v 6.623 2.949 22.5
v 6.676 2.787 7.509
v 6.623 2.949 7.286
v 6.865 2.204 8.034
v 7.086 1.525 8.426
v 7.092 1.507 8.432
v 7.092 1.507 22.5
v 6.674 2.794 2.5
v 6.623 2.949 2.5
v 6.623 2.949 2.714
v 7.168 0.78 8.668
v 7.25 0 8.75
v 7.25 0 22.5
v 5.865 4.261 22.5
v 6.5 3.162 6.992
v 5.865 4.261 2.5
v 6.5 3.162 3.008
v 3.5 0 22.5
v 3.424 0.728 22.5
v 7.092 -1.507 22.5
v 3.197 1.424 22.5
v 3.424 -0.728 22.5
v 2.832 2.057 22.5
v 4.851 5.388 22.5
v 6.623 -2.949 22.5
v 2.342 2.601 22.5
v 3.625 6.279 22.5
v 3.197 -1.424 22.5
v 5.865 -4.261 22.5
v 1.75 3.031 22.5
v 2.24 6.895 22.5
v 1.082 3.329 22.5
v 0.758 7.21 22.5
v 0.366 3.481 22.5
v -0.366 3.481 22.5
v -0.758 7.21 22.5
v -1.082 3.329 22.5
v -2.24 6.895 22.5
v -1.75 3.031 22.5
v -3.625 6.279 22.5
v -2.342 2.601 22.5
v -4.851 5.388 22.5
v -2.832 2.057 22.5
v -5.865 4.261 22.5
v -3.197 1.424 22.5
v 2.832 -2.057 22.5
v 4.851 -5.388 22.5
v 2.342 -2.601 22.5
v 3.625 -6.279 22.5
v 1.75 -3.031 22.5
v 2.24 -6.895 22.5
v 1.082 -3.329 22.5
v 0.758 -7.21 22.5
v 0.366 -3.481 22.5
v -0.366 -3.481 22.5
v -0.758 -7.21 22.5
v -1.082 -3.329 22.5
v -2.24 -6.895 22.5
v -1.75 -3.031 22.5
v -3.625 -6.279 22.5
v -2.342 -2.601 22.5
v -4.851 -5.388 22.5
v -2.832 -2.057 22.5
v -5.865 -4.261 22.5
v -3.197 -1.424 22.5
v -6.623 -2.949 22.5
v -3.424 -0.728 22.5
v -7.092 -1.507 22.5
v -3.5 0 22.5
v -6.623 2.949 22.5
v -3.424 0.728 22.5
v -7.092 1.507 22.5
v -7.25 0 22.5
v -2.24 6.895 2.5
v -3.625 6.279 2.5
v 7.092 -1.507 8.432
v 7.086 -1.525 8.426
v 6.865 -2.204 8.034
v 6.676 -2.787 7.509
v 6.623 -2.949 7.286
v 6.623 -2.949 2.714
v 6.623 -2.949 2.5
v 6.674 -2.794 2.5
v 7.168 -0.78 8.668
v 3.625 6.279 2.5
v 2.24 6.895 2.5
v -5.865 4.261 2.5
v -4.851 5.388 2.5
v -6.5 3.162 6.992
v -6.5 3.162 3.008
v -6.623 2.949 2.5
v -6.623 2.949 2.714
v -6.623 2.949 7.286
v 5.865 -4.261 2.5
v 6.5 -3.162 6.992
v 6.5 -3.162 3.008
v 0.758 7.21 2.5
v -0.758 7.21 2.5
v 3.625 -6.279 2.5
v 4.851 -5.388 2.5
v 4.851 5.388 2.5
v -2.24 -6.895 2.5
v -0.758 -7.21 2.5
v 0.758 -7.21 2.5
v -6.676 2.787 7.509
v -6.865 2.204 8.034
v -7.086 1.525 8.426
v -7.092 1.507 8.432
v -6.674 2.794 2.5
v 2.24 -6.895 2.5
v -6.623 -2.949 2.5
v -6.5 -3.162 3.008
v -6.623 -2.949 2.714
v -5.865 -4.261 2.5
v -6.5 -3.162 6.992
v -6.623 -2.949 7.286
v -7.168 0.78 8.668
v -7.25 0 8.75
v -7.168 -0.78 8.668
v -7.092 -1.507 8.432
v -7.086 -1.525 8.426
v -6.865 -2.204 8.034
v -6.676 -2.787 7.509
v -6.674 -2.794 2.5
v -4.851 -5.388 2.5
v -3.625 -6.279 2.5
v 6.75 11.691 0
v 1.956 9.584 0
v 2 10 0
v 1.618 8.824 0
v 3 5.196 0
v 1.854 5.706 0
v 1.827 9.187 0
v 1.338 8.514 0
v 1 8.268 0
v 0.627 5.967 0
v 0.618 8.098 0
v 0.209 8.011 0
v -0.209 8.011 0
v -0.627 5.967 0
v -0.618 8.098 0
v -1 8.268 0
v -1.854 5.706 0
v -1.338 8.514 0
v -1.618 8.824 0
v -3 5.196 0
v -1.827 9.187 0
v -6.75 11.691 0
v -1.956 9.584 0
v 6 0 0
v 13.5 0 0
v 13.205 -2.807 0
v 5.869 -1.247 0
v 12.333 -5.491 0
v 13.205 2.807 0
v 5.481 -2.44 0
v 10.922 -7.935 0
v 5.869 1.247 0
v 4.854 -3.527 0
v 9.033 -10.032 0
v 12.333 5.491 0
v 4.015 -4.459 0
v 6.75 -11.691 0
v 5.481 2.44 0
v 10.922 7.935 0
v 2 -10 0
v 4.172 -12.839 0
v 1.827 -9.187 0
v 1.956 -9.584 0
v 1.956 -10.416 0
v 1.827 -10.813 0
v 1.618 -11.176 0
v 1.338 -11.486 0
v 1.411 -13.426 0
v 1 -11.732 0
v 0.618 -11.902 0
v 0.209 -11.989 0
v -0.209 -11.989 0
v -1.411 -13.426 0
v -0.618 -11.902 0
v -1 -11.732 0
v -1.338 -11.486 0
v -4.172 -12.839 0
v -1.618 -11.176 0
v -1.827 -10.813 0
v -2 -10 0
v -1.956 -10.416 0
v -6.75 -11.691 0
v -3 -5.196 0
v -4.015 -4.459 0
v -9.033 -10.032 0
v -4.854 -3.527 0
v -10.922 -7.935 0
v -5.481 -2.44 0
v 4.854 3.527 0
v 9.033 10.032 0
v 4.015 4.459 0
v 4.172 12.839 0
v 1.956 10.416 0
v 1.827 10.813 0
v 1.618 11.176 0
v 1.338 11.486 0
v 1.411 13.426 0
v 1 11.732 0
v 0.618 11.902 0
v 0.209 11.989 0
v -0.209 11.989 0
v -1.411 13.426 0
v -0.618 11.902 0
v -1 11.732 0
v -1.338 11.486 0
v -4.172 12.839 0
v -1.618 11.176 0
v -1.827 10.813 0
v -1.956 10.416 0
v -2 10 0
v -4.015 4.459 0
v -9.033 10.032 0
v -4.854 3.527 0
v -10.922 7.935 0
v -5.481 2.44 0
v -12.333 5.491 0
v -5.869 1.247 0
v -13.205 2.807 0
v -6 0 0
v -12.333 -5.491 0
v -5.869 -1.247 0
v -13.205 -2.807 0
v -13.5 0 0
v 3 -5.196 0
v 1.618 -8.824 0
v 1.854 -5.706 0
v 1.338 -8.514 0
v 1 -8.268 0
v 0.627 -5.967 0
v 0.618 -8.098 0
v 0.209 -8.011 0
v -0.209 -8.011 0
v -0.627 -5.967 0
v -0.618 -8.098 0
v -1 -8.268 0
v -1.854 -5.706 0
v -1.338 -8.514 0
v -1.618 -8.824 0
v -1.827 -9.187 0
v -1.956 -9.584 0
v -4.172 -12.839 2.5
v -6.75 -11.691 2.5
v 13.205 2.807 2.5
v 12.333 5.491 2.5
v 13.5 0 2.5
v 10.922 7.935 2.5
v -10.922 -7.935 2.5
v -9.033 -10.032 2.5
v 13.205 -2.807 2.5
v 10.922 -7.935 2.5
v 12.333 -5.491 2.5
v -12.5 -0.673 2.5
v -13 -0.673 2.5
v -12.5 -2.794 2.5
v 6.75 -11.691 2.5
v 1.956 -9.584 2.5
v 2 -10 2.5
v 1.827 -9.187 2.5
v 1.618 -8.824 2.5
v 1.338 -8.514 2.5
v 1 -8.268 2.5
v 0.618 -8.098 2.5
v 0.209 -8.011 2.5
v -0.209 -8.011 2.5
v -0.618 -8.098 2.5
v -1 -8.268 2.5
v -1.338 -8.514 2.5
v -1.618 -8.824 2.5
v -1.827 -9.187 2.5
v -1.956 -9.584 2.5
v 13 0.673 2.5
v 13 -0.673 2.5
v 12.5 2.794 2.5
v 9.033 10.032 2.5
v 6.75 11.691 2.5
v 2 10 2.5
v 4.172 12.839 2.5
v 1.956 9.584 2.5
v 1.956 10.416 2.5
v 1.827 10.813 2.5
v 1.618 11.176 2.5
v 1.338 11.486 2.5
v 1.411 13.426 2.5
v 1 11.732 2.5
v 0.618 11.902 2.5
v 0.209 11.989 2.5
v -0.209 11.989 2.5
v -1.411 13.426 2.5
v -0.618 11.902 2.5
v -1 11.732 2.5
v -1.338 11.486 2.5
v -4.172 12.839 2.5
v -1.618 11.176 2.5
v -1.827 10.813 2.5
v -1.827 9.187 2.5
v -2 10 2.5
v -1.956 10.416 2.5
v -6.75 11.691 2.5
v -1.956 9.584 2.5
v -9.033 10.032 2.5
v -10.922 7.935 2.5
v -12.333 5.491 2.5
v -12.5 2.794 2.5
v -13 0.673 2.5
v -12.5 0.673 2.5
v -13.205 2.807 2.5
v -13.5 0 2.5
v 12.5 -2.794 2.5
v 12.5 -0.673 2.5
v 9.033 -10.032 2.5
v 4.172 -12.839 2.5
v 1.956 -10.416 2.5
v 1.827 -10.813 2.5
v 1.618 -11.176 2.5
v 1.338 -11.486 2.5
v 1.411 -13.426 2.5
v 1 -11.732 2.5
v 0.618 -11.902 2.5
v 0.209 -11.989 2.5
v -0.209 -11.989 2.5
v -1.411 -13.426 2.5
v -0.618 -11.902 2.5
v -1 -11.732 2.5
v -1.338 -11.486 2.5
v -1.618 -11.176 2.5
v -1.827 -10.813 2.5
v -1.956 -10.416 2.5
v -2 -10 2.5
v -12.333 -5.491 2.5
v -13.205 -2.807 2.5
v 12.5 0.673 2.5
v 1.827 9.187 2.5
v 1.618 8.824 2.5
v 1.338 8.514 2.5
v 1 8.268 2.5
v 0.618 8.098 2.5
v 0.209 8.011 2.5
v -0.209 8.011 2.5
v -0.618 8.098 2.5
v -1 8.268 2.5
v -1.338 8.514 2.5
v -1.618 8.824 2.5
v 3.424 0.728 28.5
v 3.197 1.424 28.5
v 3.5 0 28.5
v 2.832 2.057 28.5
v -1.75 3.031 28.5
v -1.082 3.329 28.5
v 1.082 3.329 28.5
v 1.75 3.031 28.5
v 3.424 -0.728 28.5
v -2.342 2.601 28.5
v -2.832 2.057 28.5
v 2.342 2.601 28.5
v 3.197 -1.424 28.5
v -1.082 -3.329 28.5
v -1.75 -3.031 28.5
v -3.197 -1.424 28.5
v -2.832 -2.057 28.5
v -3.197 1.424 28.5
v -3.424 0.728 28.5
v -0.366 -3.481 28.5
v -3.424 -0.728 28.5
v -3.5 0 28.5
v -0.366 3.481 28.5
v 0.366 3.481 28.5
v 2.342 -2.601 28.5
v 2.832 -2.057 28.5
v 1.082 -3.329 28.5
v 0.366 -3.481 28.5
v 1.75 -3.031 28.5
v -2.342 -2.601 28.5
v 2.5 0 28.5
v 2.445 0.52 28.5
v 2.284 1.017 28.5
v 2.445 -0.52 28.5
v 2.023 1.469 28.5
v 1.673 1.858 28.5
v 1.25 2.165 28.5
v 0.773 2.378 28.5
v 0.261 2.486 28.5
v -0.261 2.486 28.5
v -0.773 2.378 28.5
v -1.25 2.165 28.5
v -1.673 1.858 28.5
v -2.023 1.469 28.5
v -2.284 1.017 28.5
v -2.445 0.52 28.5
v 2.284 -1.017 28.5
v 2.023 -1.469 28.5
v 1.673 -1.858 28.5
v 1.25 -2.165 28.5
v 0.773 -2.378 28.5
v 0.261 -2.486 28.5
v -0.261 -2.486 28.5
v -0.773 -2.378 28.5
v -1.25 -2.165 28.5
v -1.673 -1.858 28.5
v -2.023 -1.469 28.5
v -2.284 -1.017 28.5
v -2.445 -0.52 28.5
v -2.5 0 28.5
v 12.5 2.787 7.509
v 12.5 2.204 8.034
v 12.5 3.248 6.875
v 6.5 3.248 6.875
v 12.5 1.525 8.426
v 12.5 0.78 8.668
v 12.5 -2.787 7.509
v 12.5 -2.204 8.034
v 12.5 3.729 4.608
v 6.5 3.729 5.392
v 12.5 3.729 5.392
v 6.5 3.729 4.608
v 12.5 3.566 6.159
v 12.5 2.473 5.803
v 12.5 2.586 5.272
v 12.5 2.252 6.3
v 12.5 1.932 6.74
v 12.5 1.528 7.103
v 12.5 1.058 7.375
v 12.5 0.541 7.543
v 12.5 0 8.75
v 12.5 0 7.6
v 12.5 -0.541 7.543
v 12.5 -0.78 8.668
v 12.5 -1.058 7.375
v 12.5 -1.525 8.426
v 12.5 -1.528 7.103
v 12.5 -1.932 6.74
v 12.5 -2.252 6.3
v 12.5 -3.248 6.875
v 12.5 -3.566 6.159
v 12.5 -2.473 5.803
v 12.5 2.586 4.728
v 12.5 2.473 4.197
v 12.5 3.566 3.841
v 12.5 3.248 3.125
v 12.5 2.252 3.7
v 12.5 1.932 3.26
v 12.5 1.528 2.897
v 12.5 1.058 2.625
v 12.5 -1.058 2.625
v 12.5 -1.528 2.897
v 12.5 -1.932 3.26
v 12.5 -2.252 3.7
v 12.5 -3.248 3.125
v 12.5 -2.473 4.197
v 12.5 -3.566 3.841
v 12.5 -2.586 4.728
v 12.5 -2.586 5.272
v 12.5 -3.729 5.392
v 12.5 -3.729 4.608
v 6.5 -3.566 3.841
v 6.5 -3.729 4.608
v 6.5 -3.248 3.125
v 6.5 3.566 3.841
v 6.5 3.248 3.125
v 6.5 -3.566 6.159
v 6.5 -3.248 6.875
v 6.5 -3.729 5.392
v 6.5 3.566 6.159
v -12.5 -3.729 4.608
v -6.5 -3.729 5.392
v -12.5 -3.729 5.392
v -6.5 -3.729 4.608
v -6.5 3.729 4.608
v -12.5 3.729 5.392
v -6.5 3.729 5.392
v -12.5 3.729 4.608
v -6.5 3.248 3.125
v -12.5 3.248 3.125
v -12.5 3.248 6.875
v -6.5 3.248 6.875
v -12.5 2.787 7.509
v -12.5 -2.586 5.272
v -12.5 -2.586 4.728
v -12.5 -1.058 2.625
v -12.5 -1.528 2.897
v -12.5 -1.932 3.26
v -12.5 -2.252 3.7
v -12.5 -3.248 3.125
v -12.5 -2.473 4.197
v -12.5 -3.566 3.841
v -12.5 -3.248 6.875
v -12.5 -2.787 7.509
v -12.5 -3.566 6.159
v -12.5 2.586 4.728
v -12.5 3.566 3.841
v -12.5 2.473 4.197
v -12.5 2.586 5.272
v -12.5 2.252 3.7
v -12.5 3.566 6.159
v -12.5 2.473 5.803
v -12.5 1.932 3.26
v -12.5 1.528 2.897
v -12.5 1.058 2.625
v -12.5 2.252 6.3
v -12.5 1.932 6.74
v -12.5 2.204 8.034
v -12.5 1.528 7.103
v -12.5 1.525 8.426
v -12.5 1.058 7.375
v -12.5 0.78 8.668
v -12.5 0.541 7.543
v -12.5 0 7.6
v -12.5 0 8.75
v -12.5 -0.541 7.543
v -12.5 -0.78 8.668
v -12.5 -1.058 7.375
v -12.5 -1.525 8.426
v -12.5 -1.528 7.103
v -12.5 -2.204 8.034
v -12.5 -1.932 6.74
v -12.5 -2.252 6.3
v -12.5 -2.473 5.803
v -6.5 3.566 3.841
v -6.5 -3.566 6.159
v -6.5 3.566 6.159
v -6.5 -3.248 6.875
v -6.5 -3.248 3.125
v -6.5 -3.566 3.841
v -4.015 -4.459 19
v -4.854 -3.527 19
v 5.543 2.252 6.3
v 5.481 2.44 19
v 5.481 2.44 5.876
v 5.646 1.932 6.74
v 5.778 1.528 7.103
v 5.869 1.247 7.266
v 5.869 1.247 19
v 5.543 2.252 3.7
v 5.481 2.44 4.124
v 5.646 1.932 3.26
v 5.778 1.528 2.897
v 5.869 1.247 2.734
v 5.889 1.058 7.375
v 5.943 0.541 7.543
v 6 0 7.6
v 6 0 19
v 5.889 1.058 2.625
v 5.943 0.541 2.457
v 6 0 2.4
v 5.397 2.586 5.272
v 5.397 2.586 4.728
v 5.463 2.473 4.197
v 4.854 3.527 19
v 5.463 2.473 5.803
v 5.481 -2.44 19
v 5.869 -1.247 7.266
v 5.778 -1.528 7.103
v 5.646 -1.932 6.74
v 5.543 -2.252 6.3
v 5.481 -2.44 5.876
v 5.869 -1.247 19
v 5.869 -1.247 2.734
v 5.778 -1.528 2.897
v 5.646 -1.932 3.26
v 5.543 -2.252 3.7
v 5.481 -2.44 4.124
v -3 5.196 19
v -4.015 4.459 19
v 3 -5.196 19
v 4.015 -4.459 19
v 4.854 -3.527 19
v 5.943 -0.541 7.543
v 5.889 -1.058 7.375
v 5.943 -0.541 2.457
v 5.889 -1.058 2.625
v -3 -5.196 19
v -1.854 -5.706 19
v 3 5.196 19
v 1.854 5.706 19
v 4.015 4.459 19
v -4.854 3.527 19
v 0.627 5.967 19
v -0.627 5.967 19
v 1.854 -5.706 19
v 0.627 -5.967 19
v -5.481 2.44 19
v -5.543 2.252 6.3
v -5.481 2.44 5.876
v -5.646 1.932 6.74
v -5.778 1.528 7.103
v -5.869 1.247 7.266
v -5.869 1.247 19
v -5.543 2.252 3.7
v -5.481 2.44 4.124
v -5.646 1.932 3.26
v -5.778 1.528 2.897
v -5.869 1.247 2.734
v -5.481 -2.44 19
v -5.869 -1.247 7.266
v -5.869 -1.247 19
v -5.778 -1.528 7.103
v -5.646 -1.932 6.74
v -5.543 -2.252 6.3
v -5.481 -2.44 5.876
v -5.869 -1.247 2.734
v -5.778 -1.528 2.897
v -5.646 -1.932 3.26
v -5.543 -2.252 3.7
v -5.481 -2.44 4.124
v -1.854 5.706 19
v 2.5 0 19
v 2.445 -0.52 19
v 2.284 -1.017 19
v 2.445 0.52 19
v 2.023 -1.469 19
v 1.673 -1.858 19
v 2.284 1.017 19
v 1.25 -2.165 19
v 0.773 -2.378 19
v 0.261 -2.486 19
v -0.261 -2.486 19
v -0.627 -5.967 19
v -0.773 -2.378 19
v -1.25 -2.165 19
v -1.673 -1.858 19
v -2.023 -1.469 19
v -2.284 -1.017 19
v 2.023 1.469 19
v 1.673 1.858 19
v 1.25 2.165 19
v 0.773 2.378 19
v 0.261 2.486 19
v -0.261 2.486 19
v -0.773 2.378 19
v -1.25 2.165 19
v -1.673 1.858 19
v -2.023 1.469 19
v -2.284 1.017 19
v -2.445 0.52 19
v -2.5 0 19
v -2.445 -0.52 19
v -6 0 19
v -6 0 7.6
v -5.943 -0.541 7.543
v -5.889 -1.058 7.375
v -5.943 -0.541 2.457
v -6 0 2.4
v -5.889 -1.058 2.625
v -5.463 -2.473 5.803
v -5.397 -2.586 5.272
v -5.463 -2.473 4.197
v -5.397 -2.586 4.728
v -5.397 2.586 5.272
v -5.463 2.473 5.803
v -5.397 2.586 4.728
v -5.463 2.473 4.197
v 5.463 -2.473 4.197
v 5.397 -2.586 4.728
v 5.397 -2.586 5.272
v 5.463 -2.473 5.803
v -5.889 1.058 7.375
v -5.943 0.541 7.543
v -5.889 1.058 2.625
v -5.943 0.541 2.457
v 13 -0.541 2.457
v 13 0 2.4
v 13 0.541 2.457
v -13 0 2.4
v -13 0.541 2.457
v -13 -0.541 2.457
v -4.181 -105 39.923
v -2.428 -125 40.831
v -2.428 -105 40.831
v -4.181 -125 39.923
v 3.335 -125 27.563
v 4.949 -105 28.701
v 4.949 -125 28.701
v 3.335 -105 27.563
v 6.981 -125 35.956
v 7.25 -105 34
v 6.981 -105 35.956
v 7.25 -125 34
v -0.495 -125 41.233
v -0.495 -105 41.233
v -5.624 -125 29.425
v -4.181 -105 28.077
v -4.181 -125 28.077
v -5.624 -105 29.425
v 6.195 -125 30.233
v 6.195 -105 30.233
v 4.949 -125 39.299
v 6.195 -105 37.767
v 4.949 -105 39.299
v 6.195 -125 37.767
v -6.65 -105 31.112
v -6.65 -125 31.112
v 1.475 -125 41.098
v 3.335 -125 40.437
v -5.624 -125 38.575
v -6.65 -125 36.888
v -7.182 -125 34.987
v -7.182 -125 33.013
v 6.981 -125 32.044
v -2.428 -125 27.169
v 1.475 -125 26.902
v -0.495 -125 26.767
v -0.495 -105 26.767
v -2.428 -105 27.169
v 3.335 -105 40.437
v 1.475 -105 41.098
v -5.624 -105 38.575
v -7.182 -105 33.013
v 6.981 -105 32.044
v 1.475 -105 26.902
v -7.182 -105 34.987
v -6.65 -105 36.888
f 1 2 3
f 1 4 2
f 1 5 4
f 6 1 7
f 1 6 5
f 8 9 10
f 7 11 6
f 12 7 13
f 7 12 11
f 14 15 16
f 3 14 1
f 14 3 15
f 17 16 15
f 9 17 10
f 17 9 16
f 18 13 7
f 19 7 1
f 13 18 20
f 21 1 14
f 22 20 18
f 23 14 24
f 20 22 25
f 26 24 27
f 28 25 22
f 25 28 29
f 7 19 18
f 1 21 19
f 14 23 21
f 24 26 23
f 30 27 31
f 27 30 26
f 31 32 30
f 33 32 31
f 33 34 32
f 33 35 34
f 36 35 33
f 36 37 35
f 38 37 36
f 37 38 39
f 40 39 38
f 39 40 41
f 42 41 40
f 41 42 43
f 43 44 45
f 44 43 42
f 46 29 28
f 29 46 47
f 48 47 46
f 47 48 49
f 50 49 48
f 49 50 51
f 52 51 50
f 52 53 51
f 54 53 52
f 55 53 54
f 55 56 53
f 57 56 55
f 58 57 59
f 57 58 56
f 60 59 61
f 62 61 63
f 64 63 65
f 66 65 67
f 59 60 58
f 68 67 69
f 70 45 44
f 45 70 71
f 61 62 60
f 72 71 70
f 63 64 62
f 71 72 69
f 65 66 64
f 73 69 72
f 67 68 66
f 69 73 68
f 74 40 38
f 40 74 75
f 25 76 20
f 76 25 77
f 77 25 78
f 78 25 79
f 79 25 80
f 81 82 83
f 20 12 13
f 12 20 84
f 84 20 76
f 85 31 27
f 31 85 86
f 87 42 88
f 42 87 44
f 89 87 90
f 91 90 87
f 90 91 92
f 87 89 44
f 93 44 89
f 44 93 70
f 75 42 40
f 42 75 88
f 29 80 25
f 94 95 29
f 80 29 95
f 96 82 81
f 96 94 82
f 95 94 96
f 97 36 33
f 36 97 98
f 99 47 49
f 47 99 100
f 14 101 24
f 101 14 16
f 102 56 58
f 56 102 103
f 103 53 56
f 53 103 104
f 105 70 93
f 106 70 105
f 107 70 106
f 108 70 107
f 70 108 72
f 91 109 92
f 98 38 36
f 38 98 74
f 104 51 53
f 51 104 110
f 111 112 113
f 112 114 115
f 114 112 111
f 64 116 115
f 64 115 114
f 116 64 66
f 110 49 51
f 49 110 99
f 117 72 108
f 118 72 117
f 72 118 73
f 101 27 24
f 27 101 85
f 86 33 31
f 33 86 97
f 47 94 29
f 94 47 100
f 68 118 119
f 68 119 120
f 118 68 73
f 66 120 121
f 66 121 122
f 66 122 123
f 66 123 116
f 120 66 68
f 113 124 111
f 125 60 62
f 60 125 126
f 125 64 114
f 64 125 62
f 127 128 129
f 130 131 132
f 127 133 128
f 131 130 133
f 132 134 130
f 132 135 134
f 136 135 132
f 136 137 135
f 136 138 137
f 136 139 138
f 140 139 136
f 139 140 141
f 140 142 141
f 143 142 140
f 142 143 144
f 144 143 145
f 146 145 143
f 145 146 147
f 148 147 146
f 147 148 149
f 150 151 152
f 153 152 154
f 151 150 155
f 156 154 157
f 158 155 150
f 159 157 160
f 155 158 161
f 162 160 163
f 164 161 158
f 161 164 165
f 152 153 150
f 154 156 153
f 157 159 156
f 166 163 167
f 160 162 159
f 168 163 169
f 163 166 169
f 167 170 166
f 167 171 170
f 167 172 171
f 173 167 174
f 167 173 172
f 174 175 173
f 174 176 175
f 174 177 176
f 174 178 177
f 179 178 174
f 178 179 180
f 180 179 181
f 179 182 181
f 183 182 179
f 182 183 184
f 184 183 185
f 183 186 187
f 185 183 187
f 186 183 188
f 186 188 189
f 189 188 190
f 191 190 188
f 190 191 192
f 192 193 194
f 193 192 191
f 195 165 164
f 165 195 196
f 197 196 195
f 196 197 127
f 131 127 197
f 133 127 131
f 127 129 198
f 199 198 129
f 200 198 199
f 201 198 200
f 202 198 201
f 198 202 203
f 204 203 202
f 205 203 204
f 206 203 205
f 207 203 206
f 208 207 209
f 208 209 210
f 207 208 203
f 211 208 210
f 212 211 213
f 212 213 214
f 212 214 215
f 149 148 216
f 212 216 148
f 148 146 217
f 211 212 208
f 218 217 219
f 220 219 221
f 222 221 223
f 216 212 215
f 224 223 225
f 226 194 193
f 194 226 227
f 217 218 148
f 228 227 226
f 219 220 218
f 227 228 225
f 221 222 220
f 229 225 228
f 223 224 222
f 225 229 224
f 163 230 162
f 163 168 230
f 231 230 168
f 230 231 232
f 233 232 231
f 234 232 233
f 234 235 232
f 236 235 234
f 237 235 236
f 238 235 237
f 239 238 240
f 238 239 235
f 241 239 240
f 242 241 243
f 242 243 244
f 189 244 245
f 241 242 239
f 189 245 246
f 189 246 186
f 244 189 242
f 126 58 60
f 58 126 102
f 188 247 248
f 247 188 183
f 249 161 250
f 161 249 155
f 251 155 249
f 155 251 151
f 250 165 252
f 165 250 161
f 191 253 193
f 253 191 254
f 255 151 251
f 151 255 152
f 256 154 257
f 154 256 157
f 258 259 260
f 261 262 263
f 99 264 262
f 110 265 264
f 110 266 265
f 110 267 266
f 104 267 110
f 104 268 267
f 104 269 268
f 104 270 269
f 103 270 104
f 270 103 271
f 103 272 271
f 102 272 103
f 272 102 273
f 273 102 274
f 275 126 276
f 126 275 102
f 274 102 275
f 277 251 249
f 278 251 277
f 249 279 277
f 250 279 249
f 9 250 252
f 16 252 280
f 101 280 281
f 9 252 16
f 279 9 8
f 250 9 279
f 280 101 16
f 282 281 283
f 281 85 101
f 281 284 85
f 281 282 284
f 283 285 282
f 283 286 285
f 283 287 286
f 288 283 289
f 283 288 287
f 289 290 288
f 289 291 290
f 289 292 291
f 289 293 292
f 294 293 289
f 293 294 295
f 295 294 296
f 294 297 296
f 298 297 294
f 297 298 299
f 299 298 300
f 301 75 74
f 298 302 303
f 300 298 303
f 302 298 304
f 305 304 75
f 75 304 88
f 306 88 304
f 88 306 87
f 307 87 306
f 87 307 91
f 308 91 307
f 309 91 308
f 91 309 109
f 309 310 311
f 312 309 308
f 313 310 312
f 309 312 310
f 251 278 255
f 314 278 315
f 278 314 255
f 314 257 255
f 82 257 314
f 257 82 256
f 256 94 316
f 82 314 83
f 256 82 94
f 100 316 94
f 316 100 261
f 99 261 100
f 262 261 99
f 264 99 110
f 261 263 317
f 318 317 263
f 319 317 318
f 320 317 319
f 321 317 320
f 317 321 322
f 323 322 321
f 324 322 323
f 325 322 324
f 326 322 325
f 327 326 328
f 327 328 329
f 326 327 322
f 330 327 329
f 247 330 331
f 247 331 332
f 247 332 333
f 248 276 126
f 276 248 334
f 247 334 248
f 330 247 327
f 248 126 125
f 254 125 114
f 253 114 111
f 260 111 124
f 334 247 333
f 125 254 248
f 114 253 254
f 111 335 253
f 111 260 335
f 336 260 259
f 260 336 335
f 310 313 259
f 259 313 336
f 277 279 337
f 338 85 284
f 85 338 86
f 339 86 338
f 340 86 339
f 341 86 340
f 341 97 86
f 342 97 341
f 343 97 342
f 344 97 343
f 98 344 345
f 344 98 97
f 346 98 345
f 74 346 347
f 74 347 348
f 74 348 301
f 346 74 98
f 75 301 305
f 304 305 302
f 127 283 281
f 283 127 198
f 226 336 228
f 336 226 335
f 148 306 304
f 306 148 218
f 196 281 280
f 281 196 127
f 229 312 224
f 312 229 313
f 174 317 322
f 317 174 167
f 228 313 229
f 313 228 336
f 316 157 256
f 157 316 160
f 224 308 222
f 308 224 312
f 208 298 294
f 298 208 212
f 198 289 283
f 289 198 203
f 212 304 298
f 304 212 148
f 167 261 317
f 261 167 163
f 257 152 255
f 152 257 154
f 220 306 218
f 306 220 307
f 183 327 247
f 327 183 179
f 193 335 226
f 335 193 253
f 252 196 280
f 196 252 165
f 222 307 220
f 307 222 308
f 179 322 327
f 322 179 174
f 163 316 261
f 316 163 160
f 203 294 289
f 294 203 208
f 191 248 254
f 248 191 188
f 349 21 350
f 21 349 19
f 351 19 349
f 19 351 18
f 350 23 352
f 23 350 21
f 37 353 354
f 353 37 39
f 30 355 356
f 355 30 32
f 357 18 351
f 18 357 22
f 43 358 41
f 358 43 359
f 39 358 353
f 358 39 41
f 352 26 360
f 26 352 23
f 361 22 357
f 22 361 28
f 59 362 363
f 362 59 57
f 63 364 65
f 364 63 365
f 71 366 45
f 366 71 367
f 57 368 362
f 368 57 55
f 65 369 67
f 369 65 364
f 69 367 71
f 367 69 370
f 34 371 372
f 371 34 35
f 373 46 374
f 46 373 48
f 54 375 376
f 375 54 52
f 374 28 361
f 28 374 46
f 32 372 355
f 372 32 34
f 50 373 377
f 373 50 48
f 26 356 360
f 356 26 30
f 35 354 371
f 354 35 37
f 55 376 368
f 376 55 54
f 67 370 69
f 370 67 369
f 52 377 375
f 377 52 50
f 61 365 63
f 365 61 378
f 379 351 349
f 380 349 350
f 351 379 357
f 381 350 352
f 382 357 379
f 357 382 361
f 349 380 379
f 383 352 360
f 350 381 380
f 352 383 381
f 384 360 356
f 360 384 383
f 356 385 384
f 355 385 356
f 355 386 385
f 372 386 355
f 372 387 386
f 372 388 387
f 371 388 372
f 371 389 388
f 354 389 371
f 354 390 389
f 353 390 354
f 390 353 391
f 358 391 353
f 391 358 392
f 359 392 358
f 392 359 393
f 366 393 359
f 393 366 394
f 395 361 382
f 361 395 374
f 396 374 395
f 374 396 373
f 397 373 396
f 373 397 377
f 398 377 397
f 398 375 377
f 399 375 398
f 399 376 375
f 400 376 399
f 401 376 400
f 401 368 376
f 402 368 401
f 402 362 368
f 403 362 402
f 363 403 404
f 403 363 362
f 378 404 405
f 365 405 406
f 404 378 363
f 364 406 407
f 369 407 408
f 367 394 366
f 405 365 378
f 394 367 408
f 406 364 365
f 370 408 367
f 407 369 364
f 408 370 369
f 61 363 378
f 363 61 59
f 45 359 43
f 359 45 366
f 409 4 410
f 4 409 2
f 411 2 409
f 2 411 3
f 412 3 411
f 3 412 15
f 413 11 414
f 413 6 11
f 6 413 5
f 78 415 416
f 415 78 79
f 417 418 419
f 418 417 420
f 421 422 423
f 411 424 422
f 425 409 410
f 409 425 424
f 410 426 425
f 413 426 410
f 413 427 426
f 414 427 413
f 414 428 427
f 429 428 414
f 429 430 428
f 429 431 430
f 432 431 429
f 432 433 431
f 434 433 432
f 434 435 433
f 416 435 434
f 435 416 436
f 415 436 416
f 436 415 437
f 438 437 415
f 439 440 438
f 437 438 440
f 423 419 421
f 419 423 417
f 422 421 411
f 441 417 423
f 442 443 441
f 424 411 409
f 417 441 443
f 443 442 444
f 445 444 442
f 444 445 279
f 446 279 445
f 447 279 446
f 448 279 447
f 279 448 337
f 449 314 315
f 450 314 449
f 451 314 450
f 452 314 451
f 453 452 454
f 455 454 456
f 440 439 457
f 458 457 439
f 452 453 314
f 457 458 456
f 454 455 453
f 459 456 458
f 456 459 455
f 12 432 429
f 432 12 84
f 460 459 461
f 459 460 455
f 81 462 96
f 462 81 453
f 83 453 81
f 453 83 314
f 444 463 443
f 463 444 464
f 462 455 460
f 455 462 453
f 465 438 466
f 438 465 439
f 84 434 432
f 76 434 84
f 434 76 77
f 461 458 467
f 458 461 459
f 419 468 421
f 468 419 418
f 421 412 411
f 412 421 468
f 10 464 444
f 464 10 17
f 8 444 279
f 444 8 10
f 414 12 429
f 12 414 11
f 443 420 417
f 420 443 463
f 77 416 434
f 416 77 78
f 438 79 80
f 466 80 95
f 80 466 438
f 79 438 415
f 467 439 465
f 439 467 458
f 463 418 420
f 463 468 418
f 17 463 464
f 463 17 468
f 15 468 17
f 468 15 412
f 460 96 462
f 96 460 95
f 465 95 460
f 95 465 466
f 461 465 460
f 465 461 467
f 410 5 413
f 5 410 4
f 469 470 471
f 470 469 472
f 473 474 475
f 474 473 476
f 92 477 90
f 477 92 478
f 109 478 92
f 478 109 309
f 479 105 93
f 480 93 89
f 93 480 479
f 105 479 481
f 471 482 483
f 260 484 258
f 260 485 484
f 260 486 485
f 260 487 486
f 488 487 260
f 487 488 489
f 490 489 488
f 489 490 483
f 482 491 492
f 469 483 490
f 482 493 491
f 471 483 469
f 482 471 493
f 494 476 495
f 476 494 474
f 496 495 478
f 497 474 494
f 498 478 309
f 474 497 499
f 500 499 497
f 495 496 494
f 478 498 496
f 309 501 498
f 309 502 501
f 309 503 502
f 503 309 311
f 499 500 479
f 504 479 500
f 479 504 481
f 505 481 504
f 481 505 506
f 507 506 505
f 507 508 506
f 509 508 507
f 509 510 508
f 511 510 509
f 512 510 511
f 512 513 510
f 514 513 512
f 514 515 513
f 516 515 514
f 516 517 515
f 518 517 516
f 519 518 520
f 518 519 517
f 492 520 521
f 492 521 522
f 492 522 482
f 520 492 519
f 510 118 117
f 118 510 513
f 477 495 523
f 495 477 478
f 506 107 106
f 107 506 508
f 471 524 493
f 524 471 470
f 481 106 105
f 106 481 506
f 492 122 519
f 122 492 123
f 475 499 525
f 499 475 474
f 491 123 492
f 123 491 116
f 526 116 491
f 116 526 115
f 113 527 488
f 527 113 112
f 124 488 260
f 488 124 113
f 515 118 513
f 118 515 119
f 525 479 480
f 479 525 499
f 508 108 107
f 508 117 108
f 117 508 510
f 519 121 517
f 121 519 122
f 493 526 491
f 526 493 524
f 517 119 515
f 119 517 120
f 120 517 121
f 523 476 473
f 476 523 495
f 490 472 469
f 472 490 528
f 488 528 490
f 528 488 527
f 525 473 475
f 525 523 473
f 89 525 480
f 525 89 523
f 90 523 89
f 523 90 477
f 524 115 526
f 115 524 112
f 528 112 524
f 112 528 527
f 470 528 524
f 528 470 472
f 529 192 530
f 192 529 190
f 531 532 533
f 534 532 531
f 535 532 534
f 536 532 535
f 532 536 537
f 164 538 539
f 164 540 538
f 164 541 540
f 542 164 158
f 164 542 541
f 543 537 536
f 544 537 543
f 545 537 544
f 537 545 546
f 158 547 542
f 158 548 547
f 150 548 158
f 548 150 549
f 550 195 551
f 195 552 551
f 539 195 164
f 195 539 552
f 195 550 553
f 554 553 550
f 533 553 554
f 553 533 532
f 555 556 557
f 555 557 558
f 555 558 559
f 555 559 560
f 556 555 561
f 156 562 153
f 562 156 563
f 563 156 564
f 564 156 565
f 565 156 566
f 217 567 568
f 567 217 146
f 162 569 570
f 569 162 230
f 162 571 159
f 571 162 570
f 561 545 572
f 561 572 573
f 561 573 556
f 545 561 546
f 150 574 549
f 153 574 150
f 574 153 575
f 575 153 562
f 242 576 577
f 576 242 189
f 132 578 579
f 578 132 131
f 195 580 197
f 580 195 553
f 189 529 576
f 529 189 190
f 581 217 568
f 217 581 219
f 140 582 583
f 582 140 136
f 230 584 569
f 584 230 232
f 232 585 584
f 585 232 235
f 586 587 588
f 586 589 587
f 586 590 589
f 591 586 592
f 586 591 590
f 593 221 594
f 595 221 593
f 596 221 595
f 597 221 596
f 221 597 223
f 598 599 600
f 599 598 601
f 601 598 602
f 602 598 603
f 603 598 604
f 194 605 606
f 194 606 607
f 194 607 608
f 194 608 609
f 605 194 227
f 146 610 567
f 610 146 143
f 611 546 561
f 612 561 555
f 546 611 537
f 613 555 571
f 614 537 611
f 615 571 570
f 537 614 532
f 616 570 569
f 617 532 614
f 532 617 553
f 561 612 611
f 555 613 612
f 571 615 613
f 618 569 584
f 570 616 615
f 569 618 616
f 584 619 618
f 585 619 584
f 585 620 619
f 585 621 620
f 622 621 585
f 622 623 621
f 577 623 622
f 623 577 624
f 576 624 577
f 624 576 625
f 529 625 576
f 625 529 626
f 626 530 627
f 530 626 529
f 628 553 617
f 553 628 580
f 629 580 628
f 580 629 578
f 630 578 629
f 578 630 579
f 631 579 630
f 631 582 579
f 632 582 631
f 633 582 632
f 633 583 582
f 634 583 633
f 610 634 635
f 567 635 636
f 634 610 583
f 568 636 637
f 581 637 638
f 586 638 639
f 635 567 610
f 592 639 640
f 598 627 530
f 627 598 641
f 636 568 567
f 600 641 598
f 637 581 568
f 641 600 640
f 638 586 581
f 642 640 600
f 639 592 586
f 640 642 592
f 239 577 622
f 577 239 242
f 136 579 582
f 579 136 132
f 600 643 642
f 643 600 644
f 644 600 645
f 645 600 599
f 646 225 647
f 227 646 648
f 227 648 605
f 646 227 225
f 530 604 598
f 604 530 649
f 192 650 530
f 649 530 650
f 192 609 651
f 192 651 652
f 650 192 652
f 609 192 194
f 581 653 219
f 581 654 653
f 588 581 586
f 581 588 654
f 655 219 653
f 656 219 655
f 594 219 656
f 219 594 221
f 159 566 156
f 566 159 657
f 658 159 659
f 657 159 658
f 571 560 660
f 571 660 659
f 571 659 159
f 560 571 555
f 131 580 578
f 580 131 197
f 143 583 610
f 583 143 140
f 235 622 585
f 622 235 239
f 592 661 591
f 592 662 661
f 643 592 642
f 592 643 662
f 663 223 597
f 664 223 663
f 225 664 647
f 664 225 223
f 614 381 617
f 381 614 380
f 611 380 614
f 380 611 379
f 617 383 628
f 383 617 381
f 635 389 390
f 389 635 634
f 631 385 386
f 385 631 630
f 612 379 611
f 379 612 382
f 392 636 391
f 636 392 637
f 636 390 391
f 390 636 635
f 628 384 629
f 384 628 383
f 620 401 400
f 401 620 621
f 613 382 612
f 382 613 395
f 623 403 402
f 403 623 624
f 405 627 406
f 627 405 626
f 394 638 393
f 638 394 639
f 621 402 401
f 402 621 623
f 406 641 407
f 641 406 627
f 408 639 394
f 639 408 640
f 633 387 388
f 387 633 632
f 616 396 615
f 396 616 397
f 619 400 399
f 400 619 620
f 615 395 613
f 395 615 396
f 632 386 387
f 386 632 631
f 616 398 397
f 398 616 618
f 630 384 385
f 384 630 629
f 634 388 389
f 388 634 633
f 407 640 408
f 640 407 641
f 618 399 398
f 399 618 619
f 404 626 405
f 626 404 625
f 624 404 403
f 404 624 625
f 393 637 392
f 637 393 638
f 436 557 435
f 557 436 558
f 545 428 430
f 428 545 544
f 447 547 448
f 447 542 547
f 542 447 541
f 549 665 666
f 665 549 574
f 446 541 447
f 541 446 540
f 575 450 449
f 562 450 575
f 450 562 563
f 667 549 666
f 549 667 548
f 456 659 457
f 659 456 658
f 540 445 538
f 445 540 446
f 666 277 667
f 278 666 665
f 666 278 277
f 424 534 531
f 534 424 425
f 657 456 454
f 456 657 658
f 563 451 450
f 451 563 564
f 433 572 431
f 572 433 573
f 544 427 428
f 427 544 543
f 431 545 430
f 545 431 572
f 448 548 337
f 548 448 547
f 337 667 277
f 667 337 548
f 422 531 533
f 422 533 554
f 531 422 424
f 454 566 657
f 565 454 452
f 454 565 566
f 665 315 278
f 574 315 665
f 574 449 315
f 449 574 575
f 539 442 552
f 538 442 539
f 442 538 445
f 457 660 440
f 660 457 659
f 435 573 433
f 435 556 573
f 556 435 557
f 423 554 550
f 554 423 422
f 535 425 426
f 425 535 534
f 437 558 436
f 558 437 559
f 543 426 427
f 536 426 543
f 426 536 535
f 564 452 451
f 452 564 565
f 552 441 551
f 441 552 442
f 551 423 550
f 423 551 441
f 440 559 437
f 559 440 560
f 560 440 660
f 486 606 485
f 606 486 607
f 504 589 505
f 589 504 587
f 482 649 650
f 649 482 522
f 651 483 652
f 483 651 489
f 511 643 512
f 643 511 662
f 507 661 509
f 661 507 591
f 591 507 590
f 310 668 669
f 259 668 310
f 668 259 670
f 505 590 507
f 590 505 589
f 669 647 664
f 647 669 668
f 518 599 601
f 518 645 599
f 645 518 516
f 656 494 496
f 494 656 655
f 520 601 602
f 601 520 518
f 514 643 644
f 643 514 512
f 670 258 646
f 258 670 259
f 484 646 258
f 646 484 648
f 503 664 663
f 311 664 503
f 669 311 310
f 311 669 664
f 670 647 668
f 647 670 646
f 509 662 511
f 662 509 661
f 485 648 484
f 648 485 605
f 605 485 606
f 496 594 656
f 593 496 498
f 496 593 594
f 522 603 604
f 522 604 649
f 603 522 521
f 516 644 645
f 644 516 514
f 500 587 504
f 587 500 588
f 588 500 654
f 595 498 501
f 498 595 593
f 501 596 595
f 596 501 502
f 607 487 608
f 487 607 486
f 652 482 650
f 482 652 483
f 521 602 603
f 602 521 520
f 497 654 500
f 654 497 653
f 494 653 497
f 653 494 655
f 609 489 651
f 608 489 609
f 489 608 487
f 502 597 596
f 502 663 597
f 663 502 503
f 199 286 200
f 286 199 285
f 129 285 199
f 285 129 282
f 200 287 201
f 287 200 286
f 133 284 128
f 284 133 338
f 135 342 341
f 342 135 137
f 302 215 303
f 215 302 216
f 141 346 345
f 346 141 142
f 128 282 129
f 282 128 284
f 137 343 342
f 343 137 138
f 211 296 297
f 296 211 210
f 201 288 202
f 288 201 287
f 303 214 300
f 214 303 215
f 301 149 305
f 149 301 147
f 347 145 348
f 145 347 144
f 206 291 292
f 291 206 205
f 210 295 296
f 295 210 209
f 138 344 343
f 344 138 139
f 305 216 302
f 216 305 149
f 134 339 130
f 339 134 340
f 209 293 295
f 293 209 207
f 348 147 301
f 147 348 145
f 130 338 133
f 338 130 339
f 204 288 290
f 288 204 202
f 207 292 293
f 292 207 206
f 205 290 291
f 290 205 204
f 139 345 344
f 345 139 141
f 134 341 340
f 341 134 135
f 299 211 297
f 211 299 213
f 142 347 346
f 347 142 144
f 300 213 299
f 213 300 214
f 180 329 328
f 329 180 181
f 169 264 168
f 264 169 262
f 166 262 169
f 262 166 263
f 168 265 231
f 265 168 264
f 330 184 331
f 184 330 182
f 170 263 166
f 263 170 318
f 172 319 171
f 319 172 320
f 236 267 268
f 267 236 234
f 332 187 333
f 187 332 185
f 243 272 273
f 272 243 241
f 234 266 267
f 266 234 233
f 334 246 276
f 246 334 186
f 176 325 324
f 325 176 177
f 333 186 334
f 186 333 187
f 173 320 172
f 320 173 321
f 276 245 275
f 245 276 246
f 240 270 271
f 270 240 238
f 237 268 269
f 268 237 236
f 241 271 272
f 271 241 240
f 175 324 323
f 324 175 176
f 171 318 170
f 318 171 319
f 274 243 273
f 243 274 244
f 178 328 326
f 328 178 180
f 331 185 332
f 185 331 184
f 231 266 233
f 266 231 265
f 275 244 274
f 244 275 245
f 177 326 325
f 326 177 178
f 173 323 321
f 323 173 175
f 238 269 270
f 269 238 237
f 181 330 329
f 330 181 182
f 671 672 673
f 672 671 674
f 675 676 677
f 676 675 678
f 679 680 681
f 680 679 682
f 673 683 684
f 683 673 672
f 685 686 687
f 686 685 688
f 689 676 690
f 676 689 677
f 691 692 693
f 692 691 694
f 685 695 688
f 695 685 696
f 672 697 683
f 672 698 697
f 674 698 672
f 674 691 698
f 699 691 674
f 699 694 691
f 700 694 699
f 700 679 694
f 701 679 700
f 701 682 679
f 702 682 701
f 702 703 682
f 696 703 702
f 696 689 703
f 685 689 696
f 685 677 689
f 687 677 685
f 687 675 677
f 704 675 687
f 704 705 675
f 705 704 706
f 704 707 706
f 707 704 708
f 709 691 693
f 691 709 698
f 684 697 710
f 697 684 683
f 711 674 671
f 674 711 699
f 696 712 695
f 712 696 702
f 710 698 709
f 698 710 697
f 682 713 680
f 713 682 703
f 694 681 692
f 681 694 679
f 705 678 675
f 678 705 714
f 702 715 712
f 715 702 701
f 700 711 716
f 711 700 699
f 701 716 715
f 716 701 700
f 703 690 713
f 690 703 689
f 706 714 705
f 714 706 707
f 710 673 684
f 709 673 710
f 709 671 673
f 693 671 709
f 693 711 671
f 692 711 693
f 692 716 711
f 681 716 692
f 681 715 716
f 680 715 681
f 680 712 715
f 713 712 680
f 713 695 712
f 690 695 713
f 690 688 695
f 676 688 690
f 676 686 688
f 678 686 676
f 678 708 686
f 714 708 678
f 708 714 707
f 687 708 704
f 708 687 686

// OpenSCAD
screwD = 4;

noseHoleD = 12;
noseHoleH = 20;
tolerance = 0.1;

ledD = 5;
ledH = 6;
wallT = 2.5;

backWallL = 170;
backWallD = 250;
backWallH = 170;

pokeAreaH = 80;


module nosePoke(){
    $fn=30;
difference(){
union(){
cylinder(d=noseHoleD+wallT,h=noseHoleH+wallT);
cylinder(d=noseHoleD+2*screwD+7,h=wallT);
translate([0,0,noseHoleH+wallT]){
cylinder(d=ledD+2,h=ledH);
}//end translate

translate([(noseHoleD+1)/2,0,ledD]){
rotate([0,90,0]){
    cylinder(d=ledD+wallT,h=ledH);
}//end rotate
}//end translate

translate([-(noseHoleD+1)/2,0,ledD]){
rotate([0,-90,0]){
    cylinder(d=ledD+wallT,h=ledH);
}//end rotate
}//end translate
}//end union


translate([0,0,-1]){
cylinder(d=noseHoleD,h=noseHoleH);
cylinder(d=ledD,h=ledH+noseHoleH+wallT+5);
}//end translate

translate([(noseHoleD+1)/2-wallT,0,ledD]){
rotate([0,90,0]){
    cylinder(d=ledD+2*tolerance,h=ledH+3);
}//end rotate
}//end translate

translate([-(noseHoleD+1)/2+wallT,0,ledD]){
rotate([0,-90,0]){
    cylinder(d=ledD+2*tolerance,h=ledH+3);
}//end rotate
}//end translate

translate([0,(noseHoleD)/2+screwD,-1]){
cylinder(d=screwD,h=10);
}//end translate

translate([0,-(noseHoleD)/2-screwD,-1]){
cylinder(d=screwD,h=10);
}//end translate
}//end difference
}//end module



module backWall(){
    $fn=10;
    
    
    difference(){
    
    cylinder(d=backWallD,h=pokeAreaH);
    
    union(){
    translate([0,0,-1]){
    
        cylinder(d=backWallD-15,h=pokeAreaH+2);
        
    }//end transalte

    translate([-backWallD/2,0,-1]){
    cube([backWallD+4,backWallD,pokeAreaH+2]);
    }//end translate
}//end union
}//end difference
    }//end module
//backWall(); 
  translate([0,-(backWallD)/2+20,pokeAreaH/2-noseHoleD/2]){ 
     rotate([90,0,0]){ 
    cylinder(d=noseHoleD+wallT,h=20);
     }//end rotate
  }//end translate
  
  nosePoke();
